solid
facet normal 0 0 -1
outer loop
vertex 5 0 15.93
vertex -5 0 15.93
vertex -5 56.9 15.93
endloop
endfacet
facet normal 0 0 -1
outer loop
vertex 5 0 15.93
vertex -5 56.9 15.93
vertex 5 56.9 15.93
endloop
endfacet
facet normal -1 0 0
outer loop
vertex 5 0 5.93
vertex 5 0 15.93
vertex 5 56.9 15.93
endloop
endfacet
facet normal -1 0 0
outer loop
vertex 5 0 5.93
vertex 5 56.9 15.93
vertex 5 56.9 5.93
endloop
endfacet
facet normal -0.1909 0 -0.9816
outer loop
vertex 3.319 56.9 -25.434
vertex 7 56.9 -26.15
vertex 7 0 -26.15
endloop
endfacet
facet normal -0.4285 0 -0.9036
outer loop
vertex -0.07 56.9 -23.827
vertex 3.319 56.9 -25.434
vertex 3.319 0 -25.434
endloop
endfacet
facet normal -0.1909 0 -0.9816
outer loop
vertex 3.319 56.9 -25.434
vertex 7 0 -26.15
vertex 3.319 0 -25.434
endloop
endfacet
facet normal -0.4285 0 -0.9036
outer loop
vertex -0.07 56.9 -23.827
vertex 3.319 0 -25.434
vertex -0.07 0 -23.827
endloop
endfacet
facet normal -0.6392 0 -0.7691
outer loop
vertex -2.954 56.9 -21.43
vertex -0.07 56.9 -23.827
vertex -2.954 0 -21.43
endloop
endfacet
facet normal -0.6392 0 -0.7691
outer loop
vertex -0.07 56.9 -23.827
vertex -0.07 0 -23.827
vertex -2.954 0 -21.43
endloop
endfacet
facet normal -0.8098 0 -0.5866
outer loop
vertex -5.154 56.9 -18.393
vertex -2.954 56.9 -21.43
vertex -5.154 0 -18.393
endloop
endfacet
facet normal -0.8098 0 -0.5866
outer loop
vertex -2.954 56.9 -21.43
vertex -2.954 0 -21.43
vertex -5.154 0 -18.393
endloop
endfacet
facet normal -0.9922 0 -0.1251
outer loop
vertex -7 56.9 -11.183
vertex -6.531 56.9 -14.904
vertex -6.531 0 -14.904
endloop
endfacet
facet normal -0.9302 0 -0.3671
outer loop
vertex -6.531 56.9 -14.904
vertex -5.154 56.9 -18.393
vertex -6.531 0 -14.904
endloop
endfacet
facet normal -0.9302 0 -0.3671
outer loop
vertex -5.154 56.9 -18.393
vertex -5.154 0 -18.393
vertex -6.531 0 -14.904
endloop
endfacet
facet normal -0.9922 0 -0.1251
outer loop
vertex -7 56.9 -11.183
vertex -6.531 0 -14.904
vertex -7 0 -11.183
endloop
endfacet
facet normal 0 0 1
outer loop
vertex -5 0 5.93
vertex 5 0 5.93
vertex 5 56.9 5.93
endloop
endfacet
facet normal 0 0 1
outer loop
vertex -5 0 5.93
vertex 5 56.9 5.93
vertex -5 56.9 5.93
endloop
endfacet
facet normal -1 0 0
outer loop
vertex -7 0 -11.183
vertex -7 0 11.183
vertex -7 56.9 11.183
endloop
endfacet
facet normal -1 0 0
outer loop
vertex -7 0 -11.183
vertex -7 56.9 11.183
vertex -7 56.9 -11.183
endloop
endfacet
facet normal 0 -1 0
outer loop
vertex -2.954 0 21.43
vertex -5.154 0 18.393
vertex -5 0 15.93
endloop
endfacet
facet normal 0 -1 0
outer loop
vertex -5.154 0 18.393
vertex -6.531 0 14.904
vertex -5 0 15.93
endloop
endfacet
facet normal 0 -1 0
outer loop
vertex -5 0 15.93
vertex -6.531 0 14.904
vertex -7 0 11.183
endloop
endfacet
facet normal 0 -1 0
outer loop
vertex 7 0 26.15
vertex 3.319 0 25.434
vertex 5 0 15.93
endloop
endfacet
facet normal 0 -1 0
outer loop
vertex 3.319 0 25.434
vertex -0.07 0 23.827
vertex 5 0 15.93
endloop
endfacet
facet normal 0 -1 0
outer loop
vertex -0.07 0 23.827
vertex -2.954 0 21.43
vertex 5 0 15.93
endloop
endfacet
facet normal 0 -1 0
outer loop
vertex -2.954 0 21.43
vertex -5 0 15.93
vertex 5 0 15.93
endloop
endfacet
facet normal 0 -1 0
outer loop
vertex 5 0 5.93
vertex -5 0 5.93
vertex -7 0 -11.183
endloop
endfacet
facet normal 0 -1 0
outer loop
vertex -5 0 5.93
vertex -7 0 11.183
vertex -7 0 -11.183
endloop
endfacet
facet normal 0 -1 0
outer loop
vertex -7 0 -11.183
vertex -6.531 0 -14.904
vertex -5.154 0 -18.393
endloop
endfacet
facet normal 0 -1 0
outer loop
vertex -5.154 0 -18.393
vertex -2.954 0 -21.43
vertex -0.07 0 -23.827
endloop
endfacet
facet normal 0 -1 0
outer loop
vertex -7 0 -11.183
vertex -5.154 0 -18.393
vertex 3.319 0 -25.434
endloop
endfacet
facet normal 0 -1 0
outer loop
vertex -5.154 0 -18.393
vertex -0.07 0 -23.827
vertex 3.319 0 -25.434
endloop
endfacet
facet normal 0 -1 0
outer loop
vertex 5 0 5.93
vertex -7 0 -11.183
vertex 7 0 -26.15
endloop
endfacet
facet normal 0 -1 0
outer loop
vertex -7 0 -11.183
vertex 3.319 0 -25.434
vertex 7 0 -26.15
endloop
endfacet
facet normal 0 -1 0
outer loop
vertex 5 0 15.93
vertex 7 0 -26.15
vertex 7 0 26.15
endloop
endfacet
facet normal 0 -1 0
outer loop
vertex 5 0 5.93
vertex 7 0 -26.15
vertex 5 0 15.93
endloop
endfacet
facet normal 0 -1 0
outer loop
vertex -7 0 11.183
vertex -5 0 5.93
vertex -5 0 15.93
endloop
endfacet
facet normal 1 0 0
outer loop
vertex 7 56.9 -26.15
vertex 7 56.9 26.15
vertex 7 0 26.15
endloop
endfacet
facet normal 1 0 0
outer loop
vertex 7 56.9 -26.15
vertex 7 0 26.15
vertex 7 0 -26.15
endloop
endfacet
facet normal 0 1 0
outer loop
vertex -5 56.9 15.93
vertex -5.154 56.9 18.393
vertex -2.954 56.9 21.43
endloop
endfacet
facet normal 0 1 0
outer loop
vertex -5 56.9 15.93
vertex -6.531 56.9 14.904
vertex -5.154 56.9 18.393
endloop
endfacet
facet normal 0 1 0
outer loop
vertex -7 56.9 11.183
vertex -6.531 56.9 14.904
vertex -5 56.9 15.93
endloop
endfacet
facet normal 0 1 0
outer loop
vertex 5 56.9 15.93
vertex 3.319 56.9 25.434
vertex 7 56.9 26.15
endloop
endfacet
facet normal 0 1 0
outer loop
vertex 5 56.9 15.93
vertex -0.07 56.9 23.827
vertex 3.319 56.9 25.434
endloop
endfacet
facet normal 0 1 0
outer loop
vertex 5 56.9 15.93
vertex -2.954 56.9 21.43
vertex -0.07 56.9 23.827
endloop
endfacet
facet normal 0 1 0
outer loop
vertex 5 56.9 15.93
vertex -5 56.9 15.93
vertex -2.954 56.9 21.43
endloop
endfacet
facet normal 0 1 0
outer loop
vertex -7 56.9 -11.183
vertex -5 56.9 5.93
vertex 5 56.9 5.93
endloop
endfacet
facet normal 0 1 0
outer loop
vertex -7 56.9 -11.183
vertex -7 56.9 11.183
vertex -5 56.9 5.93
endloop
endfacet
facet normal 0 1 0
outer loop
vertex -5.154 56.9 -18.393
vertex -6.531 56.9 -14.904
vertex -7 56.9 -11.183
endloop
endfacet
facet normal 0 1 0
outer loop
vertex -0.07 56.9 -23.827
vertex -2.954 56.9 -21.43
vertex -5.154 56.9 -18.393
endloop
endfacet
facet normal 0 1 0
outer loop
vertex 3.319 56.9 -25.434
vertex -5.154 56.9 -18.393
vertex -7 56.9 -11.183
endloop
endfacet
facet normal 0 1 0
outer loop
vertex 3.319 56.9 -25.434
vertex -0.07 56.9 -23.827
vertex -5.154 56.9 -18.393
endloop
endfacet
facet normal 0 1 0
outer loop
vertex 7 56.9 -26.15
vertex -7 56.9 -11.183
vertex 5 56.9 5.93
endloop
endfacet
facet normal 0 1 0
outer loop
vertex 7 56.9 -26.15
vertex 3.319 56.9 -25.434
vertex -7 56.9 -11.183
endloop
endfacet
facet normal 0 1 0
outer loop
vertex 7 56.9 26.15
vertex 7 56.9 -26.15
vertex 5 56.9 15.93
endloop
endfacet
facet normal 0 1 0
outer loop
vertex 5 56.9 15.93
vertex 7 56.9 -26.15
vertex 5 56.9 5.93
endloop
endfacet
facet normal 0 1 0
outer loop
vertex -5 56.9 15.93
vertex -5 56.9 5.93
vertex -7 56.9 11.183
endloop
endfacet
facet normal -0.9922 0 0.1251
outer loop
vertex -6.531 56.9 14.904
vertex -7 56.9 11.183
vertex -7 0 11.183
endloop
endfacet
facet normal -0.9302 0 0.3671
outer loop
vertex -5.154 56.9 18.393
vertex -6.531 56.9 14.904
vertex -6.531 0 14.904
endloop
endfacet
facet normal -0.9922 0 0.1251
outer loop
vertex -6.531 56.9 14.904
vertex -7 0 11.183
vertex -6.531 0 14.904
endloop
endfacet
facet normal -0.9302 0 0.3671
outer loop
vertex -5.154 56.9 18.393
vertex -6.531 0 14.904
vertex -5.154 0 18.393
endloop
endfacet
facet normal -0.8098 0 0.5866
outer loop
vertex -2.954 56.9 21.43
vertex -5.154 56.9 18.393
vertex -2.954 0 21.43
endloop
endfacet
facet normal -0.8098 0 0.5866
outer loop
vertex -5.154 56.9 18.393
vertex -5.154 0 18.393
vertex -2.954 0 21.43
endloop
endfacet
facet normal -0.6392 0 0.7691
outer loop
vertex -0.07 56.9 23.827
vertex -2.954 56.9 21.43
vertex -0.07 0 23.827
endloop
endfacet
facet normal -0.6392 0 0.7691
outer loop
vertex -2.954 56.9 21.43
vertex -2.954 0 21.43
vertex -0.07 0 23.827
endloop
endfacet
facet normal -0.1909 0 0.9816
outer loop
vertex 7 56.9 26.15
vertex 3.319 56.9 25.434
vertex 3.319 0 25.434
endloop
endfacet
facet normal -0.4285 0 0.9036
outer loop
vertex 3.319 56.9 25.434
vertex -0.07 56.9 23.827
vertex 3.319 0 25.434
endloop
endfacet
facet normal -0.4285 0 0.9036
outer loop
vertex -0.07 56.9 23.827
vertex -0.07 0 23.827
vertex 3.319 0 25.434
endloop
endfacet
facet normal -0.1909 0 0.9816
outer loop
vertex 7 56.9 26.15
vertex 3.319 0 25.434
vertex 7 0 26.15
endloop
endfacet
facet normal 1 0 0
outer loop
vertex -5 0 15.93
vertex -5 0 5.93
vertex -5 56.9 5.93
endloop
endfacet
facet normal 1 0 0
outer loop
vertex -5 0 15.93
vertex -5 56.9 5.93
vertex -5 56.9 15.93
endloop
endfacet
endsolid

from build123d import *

# Parameters (mm, degrees)
SKETCH_2_W          = 14
SKETCH_2_H          = 52.3
EXTRUDE_1_DEPTH     = 56.9
SKETCH_3_W          = 5
SKETCH_3_H          = 5
CUT_EXTRUDE_1_DEPTH = 56.9
FILLET_6_R          = 15


with BuildPart() as part:
    # Эскиз2 → Бобышка-Вытянуть1 (new body)
    with BuildSketch(Plane(origin=(0, 0, 0), x_dir=(1, 0, 0), z_dir=(0, 1, 0))):
        Rectangle(SKETCH_2_W, SKETCH_2_H)
    extrude(amount=EXTRUDE_1_DEPTH)

    # Эскиз3 → Вырез-Вытянуть1 (cut)
    with BuildSketch(Plane(origin=(0, 56.9, 0), x_dir=(1, 0, 0), z_dir=(0, 1, 0))):
        with Locations((-2.5, -13.43)):
            Rectangle(SKETCH_3_W, SKETCH_3_H)
        with Locations((-2.5, -8.43)):
            Rectangle(SKETCH_3_W, SKETCH_3_H)
        with Locations((2.5, -8.43)):
            Rectangle(SKETCH_3_W, SKETCH_3_H)
        with Locations((2.5, -13.43)):
            Rectangle(SKETCH_3_W, SKETCH_3_H)
    extrude(amount=-CUT_EXTRUDE_1_DEPTH, mode=Mode.SUBTRACT)

    # Скругление6
    # the kernel refuses this fillet: 15 mm, written as the material it takes off along each edge
    with BuildSketch(Plane(origin=(-7, -37.416573868, -26.15), x_dir=(1, 0, 0), z_dir=(0, 1, 0))) as fillet_6_piece_1:
        with BuildLine():
            CenterArc((15, -14.966629547), FILLET_6_R, 93.822553729, 86.177446271)
            Line((0, -14.966629547), (-0.3, -14.966629547))
            Line((-0.3, -14.966629547), (-0.3, 0))
            Line((-0.3, 0), (0, 0.3))
            ThreePointArc((0, 0.3), (7, 0.3), (13.98, 0.299332591))
            Line((13.98, 0.299332591), (14, 0))
        make_face()
    extrude(amount=131.733147735, mode=Mode.SUBTRACT)
    with BuildSketch(Plane(origin=(-7, -37.416573868, 26.15), x_dir=(0, 0, -1), z_dir=(0, 1, 0))) as fillet_6_piece_2:
        with BuildLine():
            CenterArc((14.966629547, -15), FILLET_6_R, 90, 86.177446271)
            Line((0, -14), (-0.299332591, -13.98))
            ThreePointArc((-0.299332591, -13.98), (-0.3, -7), (-0.3, 0))
            Line((-0.3, 0), (0, 0.3))
            Line((0, 0.3), (14.966629547, 0.3))
            Line((14.966629547, 0.3), (14.966629547, 0))
        make_face()
    extrude(amount=131.733147735, mode=Mode.SUBTRACT)


solid = part.part
